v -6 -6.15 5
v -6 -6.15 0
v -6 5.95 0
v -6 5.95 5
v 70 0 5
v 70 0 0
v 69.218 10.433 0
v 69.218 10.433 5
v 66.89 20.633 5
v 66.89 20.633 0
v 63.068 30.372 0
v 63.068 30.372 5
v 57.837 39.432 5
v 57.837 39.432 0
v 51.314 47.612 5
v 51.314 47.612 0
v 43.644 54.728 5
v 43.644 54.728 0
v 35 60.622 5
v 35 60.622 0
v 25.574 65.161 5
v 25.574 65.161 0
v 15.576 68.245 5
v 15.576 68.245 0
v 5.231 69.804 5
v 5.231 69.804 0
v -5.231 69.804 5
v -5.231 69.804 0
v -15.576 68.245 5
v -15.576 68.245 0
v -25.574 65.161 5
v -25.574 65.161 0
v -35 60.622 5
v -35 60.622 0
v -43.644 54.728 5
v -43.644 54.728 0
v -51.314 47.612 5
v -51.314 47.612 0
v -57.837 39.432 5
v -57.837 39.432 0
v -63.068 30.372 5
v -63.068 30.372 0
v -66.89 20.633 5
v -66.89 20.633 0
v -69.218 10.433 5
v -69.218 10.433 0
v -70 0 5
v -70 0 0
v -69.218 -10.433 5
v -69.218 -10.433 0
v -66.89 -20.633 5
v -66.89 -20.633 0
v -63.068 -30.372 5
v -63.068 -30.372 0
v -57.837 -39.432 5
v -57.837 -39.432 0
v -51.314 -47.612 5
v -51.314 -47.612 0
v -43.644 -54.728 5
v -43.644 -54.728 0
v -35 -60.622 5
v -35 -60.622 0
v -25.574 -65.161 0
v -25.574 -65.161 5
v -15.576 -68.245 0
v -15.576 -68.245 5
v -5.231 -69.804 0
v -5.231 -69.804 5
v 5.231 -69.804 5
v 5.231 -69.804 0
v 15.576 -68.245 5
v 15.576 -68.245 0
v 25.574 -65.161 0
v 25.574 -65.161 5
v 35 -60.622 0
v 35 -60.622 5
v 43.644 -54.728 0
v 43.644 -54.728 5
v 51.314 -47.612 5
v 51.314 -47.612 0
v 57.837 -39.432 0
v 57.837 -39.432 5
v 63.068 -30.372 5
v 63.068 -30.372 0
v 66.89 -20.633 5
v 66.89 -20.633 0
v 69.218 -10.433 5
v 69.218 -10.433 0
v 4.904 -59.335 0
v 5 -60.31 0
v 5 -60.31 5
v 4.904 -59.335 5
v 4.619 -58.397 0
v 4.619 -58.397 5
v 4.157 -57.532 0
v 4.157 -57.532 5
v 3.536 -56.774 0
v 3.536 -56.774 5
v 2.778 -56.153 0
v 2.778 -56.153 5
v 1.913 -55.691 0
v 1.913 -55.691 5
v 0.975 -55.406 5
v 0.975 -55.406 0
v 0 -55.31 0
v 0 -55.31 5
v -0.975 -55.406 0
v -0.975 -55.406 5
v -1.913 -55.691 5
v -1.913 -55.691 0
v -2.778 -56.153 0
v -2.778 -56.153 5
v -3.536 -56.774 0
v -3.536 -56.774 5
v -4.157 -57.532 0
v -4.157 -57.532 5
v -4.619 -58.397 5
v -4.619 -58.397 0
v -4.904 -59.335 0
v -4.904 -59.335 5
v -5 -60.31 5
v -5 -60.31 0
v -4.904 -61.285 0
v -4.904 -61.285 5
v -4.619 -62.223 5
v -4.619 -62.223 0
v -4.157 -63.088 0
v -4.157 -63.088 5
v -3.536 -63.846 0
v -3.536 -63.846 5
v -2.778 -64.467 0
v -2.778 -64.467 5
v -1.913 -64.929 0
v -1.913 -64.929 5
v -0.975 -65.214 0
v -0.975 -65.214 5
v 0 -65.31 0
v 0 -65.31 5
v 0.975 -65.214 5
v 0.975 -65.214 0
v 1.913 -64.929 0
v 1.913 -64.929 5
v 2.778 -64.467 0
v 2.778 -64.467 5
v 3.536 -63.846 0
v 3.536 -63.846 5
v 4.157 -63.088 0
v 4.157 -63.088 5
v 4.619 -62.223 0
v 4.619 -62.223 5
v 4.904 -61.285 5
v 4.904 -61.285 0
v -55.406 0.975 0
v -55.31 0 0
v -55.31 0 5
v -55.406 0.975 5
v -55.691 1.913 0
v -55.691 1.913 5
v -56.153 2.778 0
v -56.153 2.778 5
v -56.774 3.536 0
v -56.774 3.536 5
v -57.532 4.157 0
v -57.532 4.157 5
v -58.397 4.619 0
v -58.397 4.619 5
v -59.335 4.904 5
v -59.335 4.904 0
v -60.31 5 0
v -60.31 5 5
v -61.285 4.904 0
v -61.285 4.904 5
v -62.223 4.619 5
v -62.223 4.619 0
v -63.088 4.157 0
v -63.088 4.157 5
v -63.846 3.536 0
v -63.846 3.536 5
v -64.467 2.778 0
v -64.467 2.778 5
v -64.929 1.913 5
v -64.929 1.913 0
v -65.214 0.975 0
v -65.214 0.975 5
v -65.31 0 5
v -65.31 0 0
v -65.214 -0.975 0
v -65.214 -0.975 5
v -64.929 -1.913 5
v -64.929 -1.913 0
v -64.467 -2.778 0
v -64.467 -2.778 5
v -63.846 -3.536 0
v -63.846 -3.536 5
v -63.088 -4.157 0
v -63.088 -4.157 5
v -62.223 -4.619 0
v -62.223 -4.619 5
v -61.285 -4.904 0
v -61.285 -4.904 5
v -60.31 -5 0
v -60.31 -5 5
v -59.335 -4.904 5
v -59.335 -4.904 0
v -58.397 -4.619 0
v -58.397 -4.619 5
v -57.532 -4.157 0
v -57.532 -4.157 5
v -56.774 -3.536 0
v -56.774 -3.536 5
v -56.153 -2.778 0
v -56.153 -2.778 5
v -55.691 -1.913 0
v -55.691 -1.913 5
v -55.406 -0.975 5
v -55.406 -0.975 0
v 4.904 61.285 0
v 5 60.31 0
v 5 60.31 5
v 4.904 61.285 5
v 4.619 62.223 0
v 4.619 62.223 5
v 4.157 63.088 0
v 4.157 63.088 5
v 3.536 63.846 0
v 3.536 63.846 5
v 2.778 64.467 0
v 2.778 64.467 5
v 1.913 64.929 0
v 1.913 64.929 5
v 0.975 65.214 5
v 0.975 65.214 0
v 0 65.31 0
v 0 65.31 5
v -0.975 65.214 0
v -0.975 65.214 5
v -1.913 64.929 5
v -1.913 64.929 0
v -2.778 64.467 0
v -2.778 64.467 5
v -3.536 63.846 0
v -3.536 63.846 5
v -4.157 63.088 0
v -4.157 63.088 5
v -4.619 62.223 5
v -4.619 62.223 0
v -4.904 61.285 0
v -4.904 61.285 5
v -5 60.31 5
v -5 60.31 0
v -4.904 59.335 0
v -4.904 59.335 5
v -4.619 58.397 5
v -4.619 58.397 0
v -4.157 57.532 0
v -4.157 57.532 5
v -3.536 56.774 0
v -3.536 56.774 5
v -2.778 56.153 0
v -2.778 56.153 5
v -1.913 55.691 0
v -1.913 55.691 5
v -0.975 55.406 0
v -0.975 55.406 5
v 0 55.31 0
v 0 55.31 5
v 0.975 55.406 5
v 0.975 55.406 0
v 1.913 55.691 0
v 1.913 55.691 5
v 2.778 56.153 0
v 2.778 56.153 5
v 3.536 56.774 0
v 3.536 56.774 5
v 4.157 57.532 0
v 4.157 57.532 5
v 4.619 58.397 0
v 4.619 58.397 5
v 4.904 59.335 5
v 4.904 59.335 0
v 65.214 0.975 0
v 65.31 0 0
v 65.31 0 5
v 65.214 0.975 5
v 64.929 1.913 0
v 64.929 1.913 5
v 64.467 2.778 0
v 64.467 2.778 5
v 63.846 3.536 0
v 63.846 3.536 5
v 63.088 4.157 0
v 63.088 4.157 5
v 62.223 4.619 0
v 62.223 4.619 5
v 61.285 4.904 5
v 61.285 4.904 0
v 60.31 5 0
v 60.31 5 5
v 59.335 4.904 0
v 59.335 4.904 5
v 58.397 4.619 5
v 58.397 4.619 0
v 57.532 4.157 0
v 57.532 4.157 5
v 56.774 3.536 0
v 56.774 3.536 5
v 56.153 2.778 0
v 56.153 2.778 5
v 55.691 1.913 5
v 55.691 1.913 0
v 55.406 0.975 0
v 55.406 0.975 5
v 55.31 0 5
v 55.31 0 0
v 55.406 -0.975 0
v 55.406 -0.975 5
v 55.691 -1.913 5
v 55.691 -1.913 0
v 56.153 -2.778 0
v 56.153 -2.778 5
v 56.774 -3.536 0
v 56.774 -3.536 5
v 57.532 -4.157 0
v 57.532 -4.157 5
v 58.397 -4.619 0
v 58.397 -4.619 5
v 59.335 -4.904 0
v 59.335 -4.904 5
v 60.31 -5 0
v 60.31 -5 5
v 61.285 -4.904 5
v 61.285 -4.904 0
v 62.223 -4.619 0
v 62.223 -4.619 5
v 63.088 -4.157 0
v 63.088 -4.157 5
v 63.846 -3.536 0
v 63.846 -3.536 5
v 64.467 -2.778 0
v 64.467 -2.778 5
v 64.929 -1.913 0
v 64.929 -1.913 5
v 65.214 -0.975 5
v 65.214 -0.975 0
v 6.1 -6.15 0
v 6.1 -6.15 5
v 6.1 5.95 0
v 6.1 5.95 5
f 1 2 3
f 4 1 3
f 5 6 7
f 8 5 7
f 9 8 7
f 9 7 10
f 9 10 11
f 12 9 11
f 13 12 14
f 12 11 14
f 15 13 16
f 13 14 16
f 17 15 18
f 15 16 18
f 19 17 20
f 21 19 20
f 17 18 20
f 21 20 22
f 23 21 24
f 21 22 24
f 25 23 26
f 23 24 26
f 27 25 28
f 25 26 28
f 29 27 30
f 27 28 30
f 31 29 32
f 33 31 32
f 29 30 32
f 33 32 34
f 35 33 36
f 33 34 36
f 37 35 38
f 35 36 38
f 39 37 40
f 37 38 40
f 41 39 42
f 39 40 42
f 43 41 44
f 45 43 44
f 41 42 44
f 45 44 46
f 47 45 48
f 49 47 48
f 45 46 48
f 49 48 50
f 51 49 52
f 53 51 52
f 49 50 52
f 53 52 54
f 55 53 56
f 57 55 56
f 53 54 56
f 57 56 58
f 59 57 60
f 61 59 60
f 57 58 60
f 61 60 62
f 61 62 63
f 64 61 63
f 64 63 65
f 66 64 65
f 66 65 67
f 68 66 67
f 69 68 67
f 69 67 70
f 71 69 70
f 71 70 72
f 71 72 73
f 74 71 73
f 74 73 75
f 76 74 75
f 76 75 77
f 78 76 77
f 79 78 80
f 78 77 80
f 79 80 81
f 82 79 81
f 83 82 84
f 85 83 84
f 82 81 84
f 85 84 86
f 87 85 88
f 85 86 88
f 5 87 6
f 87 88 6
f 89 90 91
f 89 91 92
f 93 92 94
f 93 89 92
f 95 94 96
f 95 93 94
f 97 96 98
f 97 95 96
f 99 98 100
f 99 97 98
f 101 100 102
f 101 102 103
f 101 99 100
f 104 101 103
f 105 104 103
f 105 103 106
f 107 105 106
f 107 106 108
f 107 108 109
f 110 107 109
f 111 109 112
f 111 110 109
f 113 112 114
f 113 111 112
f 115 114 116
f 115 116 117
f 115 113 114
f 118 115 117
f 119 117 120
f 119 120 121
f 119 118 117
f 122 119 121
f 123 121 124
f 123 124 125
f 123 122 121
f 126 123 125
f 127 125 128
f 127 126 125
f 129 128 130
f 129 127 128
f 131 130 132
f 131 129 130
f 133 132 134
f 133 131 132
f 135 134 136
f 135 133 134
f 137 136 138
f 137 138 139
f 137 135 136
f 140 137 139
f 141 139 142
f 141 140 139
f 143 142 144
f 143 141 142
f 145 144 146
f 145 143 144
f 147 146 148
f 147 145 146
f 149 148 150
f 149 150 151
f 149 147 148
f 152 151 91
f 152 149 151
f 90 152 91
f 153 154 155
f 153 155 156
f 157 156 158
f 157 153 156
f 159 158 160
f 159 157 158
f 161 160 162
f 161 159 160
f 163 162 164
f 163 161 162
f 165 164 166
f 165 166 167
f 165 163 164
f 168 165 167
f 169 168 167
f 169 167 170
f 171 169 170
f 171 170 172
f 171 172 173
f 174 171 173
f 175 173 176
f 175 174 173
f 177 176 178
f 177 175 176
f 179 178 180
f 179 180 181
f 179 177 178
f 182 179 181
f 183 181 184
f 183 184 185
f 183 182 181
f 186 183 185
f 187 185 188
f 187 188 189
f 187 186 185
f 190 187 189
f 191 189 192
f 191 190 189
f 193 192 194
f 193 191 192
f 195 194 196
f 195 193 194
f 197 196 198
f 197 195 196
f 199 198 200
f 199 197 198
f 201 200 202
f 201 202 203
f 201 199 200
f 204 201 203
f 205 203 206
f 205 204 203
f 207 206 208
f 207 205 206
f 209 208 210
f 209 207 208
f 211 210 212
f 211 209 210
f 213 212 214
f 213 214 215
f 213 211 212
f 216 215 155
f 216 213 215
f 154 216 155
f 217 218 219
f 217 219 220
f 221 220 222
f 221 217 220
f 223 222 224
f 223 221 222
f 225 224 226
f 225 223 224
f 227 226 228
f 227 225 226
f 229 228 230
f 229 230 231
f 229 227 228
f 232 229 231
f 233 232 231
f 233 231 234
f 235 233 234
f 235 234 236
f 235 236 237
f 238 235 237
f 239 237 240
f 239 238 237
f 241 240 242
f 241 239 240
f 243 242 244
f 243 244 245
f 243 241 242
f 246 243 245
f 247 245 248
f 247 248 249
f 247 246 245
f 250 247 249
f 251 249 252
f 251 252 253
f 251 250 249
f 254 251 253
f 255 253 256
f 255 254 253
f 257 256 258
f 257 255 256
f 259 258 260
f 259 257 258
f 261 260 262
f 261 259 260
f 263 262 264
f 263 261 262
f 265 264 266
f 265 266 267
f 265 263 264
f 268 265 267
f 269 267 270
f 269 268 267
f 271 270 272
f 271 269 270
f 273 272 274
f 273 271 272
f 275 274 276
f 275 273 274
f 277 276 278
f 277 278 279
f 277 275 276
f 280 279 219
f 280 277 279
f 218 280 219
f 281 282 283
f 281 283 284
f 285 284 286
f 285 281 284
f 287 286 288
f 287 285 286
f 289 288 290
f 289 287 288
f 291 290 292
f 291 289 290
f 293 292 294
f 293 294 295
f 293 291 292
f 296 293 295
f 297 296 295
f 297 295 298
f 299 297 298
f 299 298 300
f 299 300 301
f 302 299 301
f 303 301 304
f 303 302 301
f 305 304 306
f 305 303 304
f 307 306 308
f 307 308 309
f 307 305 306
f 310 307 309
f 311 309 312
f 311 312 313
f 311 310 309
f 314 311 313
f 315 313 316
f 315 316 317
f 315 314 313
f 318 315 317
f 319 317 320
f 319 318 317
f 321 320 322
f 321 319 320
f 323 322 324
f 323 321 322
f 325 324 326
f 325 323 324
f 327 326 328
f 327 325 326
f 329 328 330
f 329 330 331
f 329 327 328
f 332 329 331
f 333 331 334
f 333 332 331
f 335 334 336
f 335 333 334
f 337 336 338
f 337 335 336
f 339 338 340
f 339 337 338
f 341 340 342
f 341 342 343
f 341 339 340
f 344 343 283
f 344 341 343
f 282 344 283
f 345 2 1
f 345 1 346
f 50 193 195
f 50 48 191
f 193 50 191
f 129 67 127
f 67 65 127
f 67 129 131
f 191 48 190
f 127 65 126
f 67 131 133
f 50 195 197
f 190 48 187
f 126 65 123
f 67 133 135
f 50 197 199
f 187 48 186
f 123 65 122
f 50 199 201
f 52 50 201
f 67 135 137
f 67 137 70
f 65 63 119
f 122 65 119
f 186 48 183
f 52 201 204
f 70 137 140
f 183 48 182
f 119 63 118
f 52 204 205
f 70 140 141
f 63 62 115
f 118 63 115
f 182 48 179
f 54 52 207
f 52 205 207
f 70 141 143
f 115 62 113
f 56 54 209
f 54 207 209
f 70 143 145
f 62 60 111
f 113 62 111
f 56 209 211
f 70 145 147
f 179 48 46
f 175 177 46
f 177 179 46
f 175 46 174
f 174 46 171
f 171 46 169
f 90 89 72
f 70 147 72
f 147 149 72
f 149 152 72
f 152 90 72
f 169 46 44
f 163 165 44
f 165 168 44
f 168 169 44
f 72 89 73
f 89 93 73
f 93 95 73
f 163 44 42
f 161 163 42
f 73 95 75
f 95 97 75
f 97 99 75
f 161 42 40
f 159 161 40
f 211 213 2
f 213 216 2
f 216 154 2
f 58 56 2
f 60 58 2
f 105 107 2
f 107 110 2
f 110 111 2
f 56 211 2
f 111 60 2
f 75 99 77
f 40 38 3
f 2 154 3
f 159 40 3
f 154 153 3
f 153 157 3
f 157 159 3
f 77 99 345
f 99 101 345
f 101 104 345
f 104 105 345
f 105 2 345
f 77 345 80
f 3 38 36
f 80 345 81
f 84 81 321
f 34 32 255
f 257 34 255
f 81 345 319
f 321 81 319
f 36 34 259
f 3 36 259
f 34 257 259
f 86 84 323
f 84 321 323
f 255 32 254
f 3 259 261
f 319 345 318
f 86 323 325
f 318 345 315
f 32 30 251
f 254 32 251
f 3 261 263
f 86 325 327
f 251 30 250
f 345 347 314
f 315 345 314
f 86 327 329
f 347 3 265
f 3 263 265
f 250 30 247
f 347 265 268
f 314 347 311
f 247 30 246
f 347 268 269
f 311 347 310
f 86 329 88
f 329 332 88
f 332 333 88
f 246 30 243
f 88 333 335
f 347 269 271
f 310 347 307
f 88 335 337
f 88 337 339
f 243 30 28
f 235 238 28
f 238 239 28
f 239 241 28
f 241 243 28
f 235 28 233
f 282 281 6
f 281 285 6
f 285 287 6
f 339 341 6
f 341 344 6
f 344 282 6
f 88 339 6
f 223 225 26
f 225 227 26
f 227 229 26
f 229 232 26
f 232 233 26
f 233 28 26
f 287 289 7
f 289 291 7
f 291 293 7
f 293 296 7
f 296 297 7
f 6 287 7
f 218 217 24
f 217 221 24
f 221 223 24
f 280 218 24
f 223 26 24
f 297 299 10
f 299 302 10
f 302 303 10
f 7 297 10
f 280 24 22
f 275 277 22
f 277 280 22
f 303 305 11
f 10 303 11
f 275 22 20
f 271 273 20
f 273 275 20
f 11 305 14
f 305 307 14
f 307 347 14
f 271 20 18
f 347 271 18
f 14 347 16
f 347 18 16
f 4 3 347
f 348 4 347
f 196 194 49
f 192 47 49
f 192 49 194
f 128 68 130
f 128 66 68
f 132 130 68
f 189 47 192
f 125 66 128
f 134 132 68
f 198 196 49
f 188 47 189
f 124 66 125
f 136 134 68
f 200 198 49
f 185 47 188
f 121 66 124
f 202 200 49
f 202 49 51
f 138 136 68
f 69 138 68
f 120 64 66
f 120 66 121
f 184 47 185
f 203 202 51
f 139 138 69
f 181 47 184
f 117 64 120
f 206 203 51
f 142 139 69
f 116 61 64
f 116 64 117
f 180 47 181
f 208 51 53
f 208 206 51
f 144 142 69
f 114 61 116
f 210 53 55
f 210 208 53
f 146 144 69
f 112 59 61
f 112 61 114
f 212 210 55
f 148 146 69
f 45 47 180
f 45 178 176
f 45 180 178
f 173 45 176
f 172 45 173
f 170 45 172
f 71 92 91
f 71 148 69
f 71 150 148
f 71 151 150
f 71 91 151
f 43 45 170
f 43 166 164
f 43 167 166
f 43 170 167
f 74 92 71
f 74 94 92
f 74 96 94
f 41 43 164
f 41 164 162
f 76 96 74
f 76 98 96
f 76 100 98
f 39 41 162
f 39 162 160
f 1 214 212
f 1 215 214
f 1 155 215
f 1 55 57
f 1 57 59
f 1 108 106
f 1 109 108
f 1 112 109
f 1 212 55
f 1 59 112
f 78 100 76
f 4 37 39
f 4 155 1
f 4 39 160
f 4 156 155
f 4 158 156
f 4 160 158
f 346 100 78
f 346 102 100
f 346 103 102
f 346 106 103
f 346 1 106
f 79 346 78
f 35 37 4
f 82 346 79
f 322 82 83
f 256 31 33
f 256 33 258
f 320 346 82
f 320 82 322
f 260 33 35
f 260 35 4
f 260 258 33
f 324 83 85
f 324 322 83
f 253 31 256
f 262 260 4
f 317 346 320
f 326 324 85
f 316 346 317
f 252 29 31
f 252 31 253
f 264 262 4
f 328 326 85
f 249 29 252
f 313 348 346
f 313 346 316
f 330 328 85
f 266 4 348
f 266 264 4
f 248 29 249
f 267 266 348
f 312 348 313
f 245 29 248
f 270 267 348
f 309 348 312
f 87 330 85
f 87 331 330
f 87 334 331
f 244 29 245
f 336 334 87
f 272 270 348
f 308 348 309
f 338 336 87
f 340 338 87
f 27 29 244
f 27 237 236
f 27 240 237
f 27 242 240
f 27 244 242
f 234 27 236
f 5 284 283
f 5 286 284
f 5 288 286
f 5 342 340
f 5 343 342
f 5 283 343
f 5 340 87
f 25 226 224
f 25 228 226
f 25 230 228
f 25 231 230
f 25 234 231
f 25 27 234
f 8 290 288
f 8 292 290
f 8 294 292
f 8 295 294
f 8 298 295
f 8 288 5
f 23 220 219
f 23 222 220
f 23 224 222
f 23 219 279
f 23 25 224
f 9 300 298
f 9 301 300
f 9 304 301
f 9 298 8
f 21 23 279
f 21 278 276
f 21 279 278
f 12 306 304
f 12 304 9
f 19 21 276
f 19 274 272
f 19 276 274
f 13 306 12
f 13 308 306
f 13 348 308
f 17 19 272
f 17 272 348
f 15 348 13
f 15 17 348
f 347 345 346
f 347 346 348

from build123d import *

# Parameters (mm, degrees)
SKETCH1_R           = 70
SKETCH1_R_2         = 5
SKETCH1_W           = 12.1
SKETCH1_H           = 12.1
BOSS_EXTRUDE1_DEPTH = 5


with BuildPart() as part:
    # Sketch1 → Boss-Extrude1 (new body)
    with BuildSketch(Plane.XY):
        Circle(SKETCH1_R)
        with Locations((0, 60.31)):
            Circle(SKETCH1_R_2, mode=Mode.SUBTRACT)
        with Locations((60.31, 0)):
            Circle(SKETCH1_R_2, mode=Mode.SUBTRACT)
        with Locations((0, -60.31)):
            Circle(SKETCH1_R_2, mode=Mode.SUBTRACT)
        with Locations((-60.31, 0)):
            Circle(SKETCH1_R_2, mode=Mode.SUBTRACT)
        with Locations((0.05, -0.1)):
            Rectangle(SKETCH1_W, SKETCH1_H, mode=Mode.SUBTRACT)
    extrude(amount=BOSS_EXTRUDE1_DEPTH)


solid = part.part
